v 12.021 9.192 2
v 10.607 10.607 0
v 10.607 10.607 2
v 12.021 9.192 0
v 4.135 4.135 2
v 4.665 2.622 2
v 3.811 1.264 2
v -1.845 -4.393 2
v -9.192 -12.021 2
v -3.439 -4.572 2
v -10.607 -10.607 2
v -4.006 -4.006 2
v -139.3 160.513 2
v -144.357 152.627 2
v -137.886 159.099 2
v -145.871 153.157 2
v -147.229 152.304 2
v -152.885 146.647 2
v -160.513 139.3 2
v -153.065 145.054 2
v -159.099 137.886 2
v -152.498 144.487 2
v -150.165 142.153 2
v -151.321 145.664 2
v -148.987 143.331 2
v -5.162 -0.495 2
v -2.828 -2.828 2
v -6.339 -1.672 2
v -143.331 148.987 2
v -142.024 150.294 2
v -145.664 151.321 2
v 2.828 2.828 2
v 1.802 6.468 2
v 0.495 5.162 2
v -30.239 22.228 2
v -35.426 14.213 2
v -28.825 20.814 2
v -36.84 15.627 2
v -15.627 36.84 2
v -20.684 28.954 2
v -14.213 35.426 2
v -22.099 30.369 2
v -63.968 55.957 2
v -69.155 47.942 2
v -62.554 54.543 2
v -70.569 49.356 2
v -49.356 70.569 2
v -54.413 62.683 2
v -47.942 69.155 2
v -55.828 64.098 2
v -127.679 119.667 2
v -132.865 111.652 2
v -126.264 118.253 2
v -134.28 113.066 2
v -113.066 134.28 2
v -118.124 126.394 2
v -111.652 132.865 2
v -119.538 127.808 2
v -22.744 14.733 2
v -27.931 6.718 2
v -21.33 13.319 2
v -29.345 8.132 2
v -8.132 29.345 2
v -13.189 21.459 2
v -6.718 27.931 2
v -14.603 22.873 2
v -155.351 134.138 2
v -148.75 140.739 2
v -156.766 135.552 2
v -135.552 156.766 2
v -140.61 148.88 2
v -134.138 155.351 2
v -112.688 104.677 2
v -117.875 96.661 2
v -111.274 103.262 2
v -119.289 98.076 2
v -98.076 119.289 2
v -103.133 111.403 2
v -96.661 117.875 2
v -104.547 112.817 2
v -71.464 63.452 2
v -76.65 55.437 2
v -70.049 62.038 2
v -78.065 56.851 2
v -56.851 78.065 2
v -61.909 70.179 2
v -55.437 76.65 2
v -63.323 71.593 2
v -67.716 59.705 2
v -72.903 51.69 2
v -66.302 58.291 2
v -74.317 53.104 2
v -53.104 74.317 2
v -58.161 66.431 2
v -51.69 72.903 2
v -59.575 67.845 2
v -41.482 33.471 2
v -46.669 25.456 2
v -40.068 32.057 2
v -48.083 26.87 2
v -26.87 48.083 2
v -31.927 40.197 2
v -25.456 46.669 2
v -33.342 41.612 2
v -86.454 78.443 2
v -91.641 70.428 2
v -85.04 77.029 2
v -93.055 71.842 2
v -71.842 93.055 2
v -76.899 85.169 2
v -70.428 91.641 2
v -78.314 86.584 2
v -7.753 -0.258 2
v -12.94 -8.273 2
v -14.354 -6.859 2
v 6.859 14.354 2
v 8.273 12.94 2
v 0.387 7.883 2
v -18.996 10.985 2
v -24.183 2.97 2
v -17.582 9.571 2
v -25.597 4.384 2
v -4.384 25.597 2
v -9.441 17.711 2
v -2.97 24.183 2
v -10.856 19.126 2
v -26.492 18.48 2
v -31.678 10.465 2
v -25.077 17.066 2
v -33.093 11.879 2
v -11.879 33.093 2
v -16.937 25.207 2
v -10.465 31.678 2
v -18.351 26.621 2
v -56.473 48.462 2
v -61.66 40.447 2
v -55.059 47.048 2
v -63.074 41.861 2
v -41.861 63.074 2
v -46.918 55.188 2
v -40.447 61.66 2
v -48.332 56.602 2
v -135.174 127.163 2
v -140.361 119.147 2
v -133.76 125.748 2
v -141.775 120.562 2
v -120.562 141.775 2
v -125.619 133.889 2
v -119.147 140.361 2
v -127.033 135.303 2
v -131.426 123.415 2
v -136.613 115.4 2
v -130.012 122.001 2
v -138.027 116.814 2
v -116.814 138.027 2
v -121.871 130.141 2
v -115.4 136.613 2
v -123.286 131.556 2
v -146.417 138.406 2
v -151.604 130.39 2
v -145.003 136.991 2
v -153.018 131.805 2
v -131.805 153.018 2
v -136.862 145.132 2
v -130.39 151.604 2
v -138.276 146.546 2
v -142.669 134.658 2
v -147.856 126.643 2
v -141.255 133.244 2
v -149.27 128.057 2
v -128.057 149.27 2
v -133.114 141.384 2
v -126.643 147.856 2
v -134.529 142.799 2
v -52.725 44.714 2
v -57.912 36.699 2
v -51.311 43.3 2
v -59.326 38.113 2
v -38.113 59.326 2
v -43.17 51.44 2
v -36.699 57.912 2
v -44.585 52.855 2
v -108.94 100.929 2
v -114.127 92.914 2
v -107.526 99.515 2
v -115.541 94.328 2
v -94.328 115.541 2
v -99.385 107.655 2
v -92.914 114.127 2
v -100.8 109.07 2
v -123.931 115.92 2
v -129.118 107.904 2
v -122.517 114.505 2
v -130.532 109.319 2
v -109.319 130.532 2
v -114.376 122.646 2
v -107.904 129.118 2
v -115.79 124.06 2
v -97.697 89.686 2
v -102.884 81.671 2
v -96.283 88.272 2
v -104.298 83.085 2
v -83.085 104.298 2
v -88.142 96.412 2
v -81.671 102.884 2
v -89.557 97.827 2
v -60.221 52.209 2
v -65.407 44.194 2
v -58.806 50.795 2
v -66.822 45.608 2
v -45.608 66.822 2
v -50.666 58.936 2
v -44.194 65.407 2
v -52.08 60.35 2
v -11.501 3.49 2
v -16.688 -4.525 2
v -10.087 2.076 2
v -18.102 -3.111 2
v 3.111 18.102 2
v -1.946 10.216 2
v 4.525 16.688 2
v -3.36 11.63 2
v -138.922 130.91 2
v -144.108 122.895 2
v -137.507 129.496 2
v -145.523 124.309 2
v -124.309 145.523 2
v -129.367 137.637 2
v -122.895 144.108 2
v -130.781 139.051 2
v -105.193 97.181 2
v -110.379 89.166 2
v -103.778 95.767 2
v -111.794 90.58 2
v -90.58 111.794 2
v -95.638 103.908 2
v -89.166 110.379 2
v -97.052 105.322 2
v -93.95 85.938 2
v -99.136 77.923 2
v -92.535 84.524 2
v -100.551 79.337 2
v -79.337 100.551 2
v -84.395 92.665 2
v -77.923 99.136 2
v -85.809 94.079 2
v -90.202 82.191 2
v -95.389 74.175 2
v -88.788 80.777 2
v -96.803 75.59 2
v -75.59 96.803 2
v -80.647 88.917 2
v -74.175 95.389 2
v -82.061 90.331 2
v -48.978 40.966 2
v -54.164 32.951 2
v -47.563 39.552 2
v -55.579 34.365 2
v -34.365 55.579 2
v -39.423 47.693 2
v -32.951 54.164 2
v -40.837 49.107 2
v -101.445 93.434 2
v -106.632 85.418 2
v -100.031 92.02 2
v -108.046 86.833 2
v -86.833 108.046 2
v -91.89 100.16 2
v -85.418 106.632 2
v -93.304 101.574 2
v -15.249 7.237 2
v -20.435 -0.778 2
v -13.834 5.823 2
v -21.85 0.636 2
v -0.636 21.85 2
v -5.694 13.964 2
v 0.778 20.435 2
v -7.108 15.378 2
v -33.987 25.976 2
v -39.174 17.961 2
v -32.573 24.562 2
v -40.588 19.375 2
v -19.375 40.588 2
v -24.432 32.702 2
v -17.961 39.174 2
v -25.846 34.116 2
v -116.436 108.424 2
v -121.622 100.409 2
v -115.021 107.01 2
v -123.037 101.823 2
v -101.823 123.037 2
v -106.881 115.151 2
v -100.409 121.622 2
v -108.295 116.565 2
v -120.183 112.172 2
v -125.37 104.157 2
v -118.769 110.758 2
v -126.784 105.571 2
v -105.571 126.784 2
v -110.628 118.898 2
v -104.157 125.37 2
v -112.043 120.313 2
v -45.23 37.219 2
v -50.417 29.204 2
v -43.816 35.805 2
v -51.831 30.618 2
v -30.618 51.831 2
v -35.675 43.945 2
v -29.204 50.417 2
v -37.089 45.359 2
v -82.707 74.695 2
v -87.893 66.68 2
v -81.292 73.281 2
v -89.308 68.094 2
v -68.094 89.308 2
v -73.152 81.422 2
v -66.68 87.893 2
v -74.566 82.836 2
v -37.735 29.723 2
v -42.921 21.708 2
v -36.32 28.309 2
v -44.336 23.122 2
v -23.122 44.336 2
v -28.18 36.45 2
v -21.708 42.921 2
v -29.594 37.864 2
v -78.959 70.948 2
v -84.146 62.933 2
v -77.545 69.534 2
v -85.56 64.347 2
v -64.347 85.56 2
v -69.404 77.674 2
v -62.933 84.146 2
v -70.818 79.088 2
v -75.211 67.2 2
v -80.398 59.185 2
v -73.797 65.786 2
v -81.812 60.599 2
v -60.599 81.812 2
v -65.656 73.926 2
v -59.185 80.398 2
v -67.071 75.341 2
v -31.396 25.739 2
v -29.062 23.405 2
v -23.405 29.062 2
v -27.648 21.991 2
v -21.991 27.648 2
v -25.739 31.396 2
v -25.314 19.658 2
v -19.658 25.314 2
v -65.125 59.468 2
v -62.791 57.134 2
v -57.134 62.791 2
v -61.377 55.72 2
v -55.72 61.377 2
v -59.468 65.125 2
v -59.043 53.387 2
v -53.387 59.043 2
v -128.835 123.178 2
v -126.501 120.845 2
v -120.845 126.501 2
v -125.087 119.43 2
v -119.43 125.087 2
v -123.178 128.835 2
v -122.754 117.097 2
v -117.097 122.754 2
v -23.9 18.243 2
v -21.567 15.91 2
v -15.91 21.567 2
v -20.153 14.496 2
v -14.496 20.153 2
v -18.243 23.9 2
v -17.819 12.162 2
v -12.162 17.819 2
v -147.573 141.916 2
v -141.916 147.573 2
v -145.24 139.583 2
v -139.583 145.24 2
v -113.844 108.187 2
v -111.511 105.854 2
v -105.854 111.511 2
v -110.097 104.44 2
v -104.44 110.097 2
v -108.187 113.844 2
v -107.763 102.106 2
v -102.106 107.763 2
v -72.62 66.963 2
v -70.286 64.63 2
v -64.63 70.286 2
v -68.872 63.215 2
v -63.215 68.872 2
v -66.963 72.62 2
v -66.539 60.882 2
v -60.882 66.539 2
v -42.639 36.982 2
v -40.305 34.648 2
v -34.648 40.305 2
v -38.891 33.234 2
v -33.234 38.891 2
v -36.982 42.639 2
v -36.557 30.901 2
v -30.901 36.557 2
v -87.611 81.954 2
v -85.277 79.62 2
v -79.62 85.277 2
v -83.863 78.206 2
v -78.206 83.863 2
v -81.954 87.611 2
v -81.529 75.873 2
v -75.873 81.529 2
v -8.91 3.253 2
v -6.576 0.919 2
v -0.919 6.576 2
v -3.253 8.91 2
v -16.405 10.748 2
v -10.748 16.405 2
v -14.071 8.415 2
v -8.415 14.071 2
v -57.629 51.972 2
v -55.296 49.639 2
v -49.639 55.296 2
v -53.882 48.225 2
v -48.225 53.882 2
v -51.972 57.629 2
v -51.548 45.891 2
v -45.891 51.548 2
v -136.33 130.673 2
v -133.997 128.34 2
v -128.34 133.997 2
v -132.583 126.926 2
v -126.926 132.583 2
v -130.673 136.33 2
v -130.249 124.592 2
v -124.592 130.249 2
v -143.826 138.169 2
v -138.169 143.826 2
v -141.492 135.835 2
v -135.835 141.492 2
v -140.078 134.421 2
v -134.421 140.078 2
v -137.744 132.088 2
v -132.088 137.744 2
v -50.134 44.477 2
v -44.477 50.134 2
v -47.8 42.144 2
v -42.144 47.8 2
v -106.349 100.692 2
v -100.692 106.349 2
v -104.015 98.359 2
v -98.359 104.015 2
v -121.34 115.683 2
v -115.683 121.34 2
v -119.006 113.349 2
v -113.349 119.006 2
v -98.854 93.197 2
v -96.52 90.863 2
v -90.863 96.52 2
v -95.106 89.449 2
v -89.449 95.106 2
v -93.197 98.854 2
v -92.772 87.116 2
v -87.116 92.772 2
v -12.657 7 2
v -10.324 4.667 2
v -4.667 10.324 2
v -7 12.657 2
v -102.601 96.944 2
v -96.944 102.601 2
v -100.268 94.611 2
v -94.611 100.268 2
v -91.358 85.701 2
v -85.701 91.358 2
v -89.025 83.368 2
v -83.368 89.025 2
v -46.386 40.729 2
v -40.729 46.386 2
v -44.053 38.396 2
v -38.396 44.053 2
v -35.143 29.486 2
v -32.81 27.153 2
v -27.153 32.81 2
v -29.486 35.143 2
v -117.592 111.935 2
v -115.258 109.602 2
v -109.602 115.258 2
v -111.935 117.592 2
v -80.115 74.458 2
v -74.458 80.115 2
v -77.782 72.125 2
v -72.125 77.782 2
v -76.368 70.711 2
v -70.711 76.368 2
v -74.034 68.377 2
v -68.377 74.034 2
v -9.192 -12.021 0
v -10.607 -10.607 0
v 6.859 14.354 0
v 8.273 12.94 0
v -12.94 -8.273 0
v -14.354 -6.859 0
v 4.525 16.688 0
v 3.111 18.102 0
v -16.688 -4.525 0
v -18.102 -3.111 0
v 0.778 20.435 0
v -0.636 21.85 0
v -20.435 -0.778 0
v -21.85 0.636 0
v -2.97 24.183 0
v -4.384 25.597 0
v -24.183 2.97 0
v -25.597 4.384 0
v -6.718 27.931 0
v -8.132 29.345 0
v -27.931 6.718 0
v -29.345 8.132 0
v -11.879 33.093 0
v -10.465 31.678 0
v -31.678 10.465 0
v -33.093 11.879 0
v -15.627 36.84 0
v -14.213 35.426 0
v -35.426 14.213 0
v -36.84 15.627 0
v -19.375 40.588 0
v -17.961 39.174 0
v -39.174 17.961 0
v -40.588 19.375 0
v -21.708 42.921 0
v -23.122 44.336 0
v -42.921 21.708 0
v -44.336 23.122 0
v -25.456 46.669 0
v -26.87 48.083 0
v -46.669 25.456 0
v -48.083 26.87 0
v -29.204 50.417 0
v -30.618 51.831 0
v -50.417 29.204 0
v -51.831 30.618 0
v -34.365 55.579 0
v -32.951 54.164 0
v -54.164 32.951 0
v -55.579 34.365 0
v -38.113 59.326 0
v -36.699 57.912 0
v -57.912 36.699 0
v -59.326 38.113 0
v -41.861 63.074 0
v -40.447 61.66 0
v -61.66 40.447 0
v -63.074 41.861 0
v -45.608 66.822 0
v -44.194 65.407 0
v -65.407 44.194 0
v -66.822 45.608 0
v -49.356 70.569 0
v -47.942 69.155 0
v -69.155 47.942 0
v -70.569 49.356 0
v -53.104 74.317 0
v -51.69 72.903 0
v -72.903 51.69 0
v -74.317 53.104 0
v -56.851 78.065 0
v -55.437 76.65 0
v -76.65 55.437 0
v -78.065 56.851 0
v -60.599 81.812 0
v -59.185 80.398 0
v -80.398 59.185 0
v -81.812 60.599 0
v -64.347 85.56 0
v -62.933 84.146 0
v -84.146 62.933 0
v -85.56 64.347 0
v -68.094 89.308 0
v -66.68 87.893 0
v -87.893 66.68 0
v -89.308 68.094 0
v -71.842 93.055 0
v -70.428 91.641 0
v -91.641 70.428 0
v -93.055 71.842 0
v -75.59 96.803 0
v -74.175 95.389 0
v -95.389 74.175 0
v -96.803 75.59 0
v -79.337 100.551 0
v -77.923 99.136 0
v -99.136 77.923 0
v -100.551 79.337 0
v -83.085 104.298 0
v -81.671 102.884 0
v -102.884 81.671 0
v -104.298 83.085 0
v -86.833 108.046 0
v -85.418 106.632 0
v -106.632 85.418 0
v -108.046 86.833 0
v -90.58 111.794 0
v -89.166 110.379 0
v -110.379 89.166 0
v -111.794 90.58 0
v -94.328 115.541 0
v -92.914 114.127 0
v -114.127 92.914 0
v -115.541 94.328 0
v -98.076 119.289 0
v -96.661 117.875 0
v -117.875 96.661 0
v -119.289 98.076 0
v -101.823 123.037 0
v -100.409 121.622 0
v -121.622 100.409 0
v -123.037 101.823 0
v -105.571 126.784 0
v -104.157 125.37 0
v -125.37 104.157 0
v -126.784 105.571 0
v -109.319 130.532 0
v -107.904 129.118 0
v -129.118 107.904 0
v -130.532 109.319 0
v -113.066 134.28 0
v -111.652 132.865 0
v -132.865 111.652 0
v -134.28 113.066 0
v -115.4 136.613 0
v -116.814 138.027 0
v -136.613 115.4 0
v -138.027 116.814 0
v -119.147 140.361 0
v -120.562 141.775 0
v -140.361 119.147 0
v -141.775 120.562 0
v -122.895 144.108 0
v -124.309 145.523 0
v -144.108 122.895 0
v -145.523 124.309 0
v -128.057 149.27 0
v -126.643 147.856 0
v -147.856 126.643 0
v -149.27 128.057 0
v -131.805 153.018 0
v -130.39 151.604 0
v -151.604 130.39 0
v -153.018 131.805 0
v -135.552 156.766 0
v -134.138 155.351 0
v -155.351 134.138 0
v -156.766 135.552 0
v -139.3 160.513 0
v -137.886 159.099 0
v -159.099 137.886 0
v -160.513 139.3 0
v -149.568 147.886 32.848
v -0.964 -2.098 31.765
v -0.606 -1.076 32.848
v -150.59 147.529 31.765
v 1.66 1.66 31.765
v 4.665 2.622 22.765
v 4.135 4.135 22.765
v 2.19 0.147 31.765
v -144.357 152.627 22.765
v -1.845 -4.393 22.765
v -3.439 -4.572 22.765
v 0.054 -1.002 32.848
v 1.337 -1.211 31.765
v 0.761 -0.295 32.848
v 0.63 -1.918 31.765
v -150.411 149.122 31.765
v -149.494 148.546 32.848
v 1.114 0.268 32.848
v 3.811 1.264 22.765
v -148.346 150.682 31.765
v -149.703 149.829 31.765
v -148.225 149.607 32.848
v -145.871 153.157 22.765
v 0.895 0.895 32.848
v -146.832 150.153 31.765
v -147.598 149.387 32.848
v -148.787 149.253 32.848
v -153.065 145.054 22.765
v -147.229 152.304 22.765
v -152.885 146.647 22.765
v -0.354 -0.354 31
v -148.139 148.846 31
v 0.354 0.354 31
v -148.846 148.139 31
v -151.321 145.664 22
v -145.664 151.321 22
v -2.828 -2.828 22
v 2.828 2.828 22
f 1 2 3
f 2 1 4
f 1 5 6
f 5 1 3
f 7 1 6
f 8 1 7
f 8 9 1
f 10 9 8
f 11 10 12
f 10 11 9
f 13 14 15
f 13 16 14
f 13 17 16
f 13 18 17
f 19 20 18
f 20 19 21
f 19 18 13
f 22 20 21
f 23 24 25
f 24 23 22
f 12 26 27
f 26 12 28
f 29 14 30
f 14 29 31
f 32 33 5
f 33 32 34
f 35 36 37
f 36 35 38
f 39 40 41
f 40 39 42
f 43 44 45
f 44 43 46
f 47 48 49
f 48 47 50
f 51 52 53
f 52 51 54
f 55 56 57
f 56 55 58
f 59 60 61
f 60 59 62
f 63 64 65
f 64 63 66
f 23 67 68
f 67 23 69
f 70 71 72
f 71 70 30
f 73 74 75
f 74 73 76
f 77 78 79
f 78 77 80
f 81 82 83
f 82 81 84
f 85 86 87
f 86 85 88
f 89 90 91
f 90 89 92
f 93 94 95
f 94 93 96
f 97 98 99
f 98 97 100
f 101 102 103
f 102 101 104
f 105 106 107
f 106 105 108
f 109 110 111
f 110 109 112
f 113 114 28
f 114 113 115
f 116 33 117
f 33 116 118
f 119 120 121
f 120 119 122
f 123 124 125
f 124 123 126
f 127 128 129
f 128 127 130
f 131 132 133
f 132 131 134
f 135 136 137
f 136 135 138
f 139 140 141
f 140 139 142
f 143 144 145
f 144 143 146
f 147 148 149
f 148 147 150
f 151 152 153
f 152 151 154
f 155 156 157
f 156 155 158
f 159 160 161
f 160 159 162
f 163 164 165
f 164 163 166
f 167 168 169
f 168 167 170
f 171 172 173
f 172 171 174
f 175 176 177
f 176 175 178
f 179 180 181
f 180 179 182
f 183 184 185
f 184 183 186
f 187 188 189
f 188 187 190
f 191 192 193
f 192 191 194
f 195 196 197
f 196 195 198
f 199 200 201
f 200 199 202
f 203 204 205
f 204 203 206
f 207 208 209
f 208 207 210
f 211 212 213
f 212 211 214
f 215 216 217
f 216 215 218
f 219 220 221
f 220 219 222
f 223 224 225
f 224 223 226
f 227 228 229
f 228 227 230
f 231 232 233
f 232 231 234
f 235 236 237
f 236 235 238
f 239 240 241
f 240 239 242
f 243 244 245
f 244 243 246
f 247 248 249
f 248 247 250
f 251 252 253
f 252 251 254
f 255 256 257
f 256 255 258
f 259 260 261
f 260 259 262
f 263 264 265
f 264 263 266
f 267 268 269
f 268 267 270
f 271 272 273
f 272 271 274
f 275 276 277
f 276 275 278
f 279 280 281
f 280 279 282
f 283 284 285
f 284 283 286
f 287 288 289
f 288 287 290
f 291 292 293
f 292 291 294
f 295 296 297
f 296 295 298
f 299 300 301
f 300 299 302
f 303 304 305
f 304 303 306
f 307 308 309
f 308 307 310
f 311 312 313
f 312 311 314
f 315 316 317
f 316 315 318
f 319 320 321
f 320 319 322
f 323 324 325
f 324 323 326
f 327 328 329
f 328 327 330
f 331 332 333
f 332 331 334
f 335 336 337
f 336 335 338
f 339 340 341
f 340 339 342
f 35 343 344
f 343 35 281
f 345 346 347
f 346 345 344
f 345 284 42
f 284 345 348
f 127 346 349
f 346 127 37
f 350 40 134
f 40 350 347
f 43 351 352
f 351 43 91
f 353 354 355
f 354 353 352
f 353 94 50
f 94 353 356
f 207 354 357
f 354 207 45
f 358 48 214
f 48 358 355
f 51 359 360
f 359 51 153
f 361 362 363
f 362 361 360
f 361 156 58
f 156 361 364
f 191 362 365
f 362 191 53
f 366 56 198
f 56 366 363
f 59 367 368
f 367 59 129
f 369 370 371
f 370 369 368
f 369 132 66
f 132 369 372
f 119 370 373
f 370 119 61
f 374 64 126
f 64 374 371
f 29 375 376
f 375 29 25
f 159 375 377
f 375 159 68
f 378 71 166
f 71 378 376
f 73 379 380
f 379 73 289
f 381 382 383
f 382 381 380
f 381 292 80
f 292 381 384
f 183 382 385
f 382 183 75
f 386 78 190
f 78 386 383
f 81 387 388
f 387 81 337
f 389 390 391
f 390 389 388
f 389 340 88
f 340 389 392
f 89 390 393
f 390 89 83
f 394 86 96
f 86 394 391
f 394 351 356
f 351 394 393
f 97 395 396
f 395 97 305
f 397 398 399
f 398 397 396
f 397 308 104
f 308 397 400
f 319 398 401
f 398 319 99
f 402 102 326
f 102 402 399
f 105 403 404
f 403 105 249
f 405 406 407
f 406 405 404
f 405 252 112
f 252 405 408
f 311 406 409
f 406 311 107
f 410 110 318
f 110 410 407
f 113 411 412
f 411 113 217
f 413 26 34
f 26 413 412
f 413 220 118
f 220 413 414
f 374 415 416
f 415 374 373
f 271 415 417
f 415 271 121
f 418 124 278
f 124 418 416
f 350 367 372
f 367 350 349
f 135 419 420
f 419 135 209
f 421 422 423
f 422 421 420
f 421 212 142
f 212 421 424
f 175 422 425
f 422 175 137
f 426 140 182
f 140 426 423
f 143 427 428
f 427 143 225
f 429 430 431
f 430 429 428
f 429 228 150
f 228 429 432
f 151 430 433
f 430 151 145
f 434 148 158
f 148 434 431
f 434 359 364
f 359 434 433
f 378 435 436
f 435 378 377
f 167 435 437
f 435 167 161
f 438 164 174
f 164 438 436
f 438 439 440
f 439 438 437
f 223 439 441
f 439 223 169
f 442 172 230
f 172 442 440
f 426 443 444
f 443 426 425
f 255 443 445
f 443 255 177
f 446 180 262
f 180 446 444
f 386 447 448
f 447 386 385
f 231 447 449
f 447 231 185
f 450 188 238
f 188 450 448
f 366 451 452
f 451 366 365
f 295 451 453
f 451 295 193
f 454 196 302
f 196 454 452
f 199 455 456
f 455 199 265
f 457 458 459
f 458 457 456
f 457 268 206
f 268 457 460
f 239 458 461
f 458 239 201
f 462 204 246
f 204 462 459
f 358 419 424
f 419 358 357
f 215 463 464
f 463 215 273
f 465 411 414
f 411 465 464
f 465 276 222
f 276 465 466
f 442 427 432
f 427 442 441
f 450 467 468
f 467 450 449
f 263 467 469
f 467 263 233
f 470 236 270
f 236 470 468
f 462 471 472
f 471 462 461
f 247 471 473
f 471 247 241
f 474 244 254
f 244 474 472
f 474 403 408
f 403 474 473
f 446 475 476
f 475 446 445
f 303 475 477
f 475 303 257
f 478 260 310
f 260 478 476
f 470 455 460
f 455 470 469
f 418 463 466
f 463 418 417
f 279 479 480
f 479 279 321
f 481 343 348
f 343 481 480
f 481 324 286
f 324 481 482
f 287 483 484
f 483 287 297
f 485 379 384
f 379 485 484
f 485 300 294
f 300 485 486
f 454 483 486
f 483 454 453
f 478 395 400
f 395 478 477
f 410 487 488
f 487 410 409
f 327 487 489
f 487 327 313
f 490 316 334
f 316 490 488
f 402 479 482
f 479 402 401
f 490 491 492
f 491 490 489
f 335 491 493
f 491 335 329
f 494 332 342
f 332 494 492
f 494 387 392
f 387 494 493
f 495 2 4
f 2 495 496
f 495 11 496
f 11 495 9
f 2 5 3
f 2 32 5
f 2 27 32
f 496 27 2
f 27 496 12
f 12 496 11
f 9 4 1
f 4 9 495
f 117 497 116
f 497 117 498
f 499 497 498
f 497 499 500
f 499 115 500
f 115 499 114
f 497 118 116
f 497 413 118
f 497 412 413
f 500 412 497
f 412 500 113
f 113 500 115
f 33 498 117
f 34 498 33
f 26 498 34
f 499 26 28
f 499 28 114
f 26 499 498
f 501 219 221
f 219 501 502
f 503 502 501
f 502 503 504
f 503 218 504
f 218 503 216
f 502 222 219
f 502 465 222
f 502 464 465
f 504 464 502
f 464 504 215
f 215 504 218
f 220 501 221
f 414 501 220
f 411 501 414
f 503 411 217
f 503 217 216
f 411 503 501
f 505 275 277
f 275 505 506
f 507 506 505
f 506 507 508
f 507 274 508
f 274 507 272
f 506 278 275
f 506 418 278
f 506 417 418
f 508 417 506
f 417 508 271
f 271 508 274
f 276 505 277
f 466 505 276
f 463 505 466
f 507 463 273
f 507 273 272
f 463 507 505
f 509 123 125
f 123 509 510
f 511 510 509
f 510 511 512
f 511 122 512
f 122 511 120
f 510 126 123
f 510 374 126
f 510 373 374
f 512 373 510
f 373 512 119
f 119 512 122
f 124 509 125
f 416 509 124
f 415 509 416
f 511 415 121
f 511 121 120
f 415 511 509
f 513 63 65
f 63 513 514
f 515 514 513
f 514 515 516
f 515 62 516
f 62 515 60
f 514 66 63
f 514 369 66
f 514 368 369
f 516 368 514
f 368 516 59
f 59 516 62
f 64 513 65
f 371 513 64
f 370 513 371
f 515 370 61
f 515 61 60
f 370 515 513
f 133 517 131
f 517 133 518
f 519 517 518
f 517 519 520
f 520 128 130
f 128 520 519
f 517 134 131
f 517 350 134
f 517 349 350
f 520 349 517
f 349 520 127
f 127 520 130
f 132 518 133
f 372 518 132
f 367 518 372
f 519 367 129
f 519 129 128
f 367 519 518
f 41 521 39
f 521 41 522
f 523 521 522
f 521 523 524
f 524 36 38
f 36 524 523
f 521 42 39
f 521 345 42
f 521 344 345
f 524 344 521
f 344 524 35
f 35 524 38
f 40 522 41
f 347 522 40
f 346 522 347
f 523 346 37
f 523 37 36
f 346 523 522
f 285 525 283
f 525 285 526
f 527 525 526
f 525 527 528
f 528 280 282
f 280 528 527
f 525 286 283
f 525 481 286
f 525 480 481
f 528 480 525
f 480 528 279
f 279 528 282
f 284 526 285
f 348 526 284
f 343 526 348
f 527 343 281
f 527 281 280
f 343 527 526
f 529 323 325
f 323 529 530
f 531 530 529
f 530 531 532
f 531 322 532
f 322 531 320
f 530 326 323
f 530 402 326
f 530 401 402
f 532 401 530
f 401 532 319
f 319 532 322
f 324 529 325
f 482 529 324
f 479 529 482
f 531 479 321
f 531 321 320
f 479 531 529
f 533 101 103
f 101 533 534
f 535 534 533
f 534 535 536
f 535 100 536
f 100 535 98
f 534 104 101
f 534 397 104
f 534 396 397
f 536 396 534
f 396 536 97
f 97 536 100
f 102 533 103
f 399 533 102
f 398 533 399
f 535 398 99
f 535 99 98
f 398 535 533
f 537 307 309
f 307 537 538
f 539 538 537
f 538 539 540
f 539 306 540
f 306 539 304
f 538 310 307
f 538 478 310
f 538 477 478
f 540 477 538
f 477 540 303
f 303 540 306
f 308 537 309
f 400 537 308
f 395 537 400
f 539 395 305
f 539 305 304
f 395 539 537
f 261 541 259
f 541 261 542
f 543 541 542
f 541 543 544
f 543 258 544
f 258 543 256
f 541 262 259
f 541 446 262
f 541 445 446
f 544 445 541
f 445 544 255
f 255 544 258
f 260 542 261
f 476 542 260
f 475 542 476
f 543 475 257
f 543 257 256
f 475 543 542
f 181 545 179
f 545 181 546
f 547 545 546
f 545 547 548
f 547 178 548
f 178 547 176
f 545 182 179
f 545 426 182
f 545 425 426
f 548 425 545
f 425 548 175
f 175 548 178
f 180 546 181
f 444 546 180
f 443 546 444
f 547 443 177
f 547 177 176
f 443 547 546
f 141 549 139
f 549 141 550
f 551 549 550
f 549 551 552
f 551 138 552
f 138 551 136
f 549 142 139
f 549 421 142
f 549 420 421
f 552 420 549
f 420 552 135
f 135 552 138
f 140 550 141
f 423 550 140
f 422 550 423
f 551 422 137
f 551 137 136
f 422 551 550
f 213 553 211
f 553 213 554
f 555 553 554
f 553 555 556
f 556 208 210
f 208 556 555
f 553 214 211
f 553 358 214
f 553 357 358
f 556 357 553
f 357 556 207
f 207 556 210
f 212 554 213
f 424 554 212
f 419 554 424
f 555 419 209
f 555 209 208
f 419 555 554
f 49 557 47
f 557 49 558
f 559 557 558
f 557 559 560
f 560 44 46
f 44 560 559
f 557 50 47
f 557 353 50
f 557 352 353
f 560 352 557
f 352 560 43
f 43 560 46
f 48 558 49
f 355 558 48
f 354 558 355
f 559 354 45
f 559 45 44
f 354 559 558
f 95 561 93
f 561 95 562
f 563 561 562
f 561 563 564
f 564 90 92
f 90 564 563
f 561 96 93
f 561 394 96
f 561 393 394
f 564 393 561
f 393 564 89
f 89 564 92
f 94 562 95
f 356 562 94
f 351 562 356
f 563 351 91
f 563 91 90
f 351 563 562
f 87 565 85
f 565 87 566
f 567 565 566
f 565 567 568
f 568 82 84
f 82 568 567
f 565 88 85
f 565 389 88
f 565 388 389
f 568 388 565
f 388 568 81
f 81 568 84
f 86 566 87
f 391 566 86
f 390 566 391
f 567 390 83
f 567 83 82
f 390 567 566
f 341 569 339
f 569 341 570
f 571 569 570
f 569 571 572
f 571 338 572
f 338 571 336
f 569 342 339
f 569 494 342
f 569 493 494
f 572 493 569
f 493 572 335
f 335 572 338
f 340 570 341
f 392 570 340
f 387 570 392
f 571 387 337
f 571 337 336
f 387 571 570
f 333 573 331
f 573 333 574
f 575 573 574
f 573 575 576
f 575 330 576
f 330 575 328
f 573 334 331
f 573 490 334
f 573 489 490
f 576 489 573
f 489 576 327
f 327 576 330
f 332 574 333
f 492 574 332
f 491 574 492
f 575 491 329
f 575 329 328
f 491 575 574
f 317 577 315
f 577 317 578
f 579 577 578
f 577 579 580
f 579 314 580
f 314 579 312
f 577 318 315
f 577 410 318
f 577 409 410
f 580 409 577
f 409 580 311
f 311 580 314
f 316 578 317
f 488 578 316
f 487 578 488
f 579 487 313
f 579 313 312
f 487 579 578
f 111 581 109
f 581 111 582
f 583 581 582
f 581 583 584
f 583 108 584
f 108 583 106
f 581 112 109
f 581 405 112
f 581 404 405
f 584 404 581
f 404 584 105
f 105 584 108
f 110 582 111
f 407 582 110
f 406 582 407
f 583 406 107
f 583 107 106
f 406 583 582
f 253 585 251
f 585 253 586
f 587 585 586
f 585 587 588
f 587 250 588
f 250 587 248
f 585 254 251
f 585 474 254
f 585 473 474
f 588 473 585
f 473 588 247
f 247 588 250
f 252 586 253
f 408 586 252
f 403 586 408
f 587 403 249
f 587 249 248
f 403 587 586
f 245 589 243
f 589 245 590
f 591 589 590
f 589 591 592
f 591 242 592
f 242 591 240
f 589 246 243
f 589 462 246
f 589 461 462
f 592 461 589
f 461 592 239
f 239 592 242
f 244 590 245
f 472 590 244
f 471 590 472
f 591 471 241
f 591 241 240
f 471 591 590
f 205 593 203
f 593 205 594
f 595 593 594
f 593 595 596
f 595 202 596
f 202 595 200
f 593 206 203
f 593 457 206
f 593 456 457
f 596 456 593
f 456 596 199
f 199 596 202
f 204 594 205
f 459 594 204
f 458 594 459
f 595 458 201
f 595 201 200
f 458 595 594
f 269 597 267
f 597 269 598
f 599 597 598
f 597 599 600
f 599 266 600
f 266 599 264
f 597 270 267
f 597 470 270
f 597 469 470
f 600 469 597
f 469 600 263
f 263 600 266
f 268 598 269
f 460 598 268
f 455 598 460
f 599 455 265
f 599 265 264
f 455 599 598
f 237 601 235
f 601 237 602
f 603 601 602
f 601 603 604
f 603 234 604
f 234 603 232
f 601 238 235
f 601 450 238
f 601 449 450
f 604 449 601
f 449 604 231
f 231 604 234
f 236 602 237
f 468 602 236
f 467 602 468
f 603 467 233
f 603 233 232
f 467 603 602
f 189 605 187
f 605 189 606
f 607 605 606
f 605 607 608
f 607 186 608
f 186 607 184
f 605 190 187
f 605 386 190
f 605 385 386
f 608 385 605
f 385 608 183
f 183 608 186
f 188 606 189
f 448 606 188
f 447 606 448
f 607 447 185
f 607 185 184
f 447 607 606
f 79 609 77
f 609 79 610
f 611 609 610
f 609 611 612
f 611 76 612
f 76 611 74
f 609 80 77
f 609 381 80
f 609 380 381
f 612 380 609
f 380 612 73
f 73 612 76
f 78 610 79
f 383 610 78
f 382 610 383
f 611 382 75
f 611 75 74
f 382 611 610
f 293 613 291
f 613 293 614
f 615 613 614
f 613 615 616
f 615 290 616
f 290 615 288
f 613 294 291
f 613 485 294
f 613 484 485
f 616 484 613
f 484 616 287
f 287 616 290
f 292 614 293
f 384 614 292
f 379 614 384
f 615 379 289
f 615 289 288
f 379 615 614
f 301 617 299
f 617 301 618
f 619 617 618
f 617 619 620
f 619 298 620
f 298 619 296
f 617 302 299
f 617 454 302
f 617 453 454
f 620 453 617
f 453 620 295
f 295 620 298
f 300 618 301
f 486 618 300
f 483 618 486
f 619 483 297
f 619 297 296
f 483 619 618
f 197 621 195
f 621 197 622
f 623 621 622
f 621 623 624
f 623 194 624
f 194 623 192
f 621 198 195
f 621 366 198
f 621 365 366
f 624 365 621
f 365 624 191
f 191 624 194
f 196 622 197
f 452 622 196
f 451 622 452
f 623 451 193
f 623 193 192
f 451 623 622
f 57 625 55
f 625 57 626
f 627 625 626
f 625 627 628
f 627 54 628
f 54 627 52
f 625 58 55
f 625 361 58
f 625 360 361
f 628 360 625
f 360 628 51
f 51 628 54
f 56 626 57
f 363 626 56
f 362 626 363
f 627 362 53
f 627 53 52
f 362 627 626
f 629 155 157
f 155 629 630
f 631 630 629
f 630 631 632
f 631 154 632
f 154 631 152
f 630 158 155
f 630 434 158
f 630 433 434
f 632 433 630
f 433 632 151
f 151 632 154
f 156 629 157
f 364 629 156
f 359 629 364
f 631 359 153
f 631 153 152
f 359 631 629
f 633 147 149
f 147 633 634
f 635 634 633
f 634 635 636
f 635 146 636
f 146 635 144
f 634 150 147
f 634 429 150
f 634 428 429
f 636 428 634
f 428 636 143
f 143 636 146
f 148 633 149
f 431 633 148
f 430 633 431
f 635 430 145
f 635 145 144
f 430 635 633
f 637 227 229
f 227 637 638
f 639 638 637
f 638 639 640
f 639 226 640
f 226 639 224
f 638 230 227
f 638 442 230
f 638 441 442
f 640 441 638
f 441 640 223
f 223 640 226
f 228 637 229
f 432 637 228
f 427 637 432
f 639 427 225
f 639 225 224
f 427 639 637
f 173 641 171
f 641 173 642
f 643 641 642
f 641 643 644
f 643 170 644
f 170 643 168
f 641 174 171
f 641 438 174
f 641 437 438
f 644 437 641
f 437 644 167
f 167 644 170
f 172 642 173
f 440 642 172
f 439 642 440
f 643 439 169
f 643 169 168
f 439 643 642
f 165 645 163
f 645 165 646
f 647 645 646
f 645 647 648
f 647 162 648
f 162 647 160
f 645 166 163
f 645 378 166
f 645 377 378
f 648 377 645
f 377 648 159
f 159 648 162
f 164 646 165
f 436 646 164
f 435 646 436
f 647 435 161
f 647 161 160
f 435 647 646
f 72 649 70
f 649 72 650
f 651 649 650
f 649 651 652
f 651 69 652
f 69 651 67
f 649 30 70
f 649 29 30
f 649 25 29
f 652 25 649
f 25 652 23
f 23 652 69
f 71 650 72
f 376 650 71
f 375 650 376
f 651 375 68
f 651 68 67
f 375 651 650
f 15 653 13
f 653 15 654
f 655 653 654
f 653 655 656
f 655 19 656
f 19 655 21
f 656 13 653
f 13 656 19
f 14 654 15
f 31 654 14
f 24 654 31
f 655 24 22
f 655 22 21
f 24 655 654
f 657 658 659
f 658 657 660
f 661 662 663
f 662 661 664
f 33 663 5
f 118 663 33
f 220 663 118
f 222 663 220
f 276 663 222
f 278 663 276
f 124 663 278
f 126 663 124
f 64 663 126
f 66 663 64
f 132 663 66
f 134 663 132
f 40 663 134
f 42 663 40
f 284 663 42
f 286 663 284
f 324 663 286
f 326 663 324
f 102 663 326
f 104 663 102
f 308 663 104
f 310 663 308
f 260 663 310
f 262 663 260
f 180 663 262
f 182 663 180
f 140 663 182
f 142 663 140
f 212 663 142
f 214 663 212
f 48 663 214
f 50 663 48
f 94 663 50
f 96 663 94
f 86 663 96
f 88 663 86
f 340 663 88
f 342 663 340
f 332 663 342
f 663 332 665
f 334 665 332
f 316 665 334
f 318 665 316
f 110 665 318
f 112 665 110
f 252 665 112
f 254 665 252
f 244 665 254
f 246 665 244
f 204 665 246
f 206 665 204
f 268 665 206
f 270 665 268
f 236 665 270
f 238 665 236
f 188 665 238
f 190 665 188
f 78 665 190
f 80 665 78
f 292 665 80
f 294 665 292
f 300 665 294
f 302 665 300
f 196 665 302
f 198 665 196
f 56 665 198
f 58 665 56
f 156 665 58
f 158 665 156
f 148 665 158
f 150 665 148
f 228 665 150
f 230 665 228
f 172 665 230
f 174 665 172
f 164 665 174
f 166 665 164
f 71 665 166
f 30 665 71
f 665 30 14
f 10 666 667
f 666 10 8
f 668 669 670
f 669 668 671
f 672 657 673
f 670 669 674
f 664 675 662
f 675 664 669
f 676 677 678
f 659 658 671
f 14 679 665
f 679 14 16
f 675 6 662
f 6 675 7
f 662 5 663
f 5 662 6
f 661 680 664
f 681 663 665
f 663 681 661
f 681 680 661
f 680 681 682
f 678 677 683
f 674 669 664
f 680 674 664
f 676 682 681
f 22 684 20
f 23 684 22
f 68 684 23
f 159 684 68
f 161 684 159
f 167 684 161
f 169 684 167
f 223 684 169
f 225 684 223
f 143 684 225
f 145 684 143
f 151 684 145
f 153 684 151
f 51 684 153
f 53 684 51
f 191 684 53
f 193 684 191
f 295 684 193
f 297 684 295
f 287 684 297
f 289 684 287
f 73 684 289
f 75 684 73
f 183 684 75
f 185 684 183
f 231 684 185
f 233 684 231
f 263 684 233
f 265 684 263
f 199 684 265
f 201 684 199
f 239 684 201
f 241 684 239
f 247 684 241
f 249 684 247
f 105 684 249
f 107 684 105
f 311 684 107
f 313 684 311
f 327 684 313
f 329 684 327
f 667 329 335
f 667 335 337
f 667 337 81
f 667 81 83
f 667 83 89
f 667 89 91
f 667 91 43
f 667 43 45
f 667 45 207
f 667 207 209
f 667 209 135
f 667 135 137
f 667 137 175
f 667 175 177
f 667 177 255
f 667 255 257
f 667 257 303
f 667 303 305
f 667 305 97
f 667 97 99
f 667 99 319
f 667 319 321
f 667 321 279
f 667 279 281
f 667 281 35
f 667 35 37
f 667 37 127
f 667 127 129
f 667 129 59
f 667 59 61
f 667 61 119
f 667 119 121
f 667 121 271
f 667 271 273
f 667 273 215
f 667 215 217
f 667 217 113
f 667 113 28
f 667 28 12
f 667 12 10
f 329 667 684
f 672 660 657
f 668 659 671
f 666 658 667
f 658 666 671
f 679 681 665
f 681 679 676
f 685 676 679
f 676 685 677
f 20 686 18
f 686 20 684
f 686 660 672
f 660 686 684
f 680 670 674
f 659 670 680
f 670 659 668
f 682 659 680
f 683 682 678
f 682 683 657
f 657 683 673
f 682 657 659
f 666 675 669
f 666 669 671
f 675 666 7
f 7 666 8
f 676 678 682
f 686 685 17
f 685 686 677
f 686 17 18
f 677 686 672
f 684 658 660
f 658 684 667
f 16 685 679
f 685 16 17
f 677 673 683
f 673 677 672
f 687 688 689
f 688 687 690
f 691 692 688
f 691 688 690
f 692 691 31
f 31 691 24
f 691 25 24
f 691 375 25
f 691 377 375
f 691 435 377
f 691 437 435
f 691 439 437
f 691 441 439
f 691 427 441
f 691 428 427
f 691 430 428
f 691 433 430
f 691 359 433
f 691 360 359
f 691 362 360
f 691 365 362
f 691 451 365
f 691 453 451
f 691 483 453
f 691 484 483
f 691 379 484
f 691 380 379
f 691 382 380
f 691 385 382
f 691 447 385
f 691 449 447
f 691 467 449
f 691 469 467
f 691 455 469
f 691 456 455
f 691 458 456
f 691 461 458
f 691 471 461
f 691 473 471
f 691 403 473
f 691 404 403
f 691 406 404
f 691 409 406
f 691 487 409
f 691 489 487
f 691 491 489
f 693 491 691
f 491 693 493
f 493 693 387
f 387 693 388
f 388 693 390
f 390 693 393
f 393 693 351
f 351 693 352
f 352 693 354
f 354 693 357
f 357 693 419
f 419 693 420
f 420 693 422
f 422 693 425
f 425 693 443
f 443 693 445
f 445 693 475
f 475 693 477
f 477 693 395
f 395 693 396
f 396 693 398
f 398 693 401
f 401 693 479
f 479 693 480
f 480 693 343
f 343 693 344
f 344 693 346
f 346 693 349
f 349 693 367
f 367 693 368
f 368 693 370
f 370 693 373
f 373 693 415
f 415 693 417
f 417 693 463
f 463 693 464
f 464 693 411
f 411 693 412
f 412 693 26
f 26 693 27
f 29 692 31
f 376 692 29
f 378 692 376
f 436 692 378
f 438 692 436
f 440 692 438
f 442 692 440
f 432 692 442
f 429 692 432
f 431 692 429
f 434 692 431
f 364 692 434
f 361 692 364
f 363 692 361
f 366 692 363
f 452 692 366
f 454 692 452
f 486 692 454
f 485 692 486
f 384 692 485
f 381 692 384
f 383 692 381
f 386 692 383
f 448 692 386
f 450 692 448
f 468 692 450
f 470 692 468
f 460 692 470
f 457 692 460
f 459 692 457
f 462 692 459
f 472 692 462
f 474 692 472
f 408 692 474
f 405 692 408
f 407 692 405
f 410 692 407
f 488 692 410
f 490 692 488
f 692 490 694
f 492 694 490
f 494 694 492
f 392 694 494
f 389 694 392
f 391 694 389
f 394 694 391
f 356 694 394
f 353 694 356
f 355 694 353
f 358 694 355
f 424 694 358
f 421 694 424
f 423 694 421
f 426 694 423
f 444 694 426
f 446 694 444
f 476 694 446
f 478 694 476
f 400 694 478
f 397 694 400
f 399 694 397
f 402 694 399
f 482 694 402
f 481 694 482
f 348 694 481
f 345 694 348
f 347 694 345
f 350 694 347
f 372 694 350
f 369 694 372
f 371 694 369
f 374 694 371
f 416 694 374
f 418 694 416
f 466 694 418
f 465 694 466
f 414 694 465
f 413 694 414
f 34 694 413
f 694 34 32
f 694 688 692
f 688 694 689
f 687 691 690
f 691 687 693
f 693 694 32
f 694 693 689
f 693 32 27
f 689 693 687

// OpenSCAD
/*
	3D printable small hive beetle trap
	Copyright (C) 2017 Travis John Howse

	This program is free software: you can redistribute it and/or modify
	it under the terms of the GNU General Public License as published by
	the Free Software Foundation, either version 3 of the License, or
	(at your option) any later version.

	This program is distributed in the hope that it will be useful,
	but WITHOUT ANY WARRANTY; without even the implied warranty of
	MERCHANTABILITY or FITNESS FOR A PARTICULAR PURPOSE.  See the
	GNU General Public License for more details.

	You should have received a copy of the GNU General Public License
	along with this program.  If not, see <http://www.gnu.org/licenses/>.
*/

// Gap for beetles
gap = 3.3; // [2:0.1:5]
// Wall thickness
wt = 2; // [1:3]
// How many blades. Controls the length.
blades = 40; //[5:100]
// Blade width
blade_x = 30; // [10:50]
// Oil trap width
box_x = 12; // [5:25]
// Oil trap depth
box_z = 30; // [10:60]

total_y = blades*(gap+wt)+wt;

rotate([0,0,45]) {
translate([0,-wt,0]) for (i=[0:blades]) {
	translate([-blade_x/2,i*(wt+gap),0]) cube([blade_x,wt,wt]);
}

translate([-(box_x-wt*2)/2,0,0]) box();
}

module box() {
	difference() {
		minkowski() {
			inner_box();
			sphere(r=wt);
		}
		inner_box();
		cube([1000,1000,wt*2],center=true);
	}
}

module inner_box() {
	hull() {
		cube([box_x-wt*2,total_y-wt*2,box_z-(box_x-2*wt)]);
		translate([(box_x-wt*2)/2-wt/4,0,box_z]) cube([1,total_y-wt*2,1]);
	}
}
